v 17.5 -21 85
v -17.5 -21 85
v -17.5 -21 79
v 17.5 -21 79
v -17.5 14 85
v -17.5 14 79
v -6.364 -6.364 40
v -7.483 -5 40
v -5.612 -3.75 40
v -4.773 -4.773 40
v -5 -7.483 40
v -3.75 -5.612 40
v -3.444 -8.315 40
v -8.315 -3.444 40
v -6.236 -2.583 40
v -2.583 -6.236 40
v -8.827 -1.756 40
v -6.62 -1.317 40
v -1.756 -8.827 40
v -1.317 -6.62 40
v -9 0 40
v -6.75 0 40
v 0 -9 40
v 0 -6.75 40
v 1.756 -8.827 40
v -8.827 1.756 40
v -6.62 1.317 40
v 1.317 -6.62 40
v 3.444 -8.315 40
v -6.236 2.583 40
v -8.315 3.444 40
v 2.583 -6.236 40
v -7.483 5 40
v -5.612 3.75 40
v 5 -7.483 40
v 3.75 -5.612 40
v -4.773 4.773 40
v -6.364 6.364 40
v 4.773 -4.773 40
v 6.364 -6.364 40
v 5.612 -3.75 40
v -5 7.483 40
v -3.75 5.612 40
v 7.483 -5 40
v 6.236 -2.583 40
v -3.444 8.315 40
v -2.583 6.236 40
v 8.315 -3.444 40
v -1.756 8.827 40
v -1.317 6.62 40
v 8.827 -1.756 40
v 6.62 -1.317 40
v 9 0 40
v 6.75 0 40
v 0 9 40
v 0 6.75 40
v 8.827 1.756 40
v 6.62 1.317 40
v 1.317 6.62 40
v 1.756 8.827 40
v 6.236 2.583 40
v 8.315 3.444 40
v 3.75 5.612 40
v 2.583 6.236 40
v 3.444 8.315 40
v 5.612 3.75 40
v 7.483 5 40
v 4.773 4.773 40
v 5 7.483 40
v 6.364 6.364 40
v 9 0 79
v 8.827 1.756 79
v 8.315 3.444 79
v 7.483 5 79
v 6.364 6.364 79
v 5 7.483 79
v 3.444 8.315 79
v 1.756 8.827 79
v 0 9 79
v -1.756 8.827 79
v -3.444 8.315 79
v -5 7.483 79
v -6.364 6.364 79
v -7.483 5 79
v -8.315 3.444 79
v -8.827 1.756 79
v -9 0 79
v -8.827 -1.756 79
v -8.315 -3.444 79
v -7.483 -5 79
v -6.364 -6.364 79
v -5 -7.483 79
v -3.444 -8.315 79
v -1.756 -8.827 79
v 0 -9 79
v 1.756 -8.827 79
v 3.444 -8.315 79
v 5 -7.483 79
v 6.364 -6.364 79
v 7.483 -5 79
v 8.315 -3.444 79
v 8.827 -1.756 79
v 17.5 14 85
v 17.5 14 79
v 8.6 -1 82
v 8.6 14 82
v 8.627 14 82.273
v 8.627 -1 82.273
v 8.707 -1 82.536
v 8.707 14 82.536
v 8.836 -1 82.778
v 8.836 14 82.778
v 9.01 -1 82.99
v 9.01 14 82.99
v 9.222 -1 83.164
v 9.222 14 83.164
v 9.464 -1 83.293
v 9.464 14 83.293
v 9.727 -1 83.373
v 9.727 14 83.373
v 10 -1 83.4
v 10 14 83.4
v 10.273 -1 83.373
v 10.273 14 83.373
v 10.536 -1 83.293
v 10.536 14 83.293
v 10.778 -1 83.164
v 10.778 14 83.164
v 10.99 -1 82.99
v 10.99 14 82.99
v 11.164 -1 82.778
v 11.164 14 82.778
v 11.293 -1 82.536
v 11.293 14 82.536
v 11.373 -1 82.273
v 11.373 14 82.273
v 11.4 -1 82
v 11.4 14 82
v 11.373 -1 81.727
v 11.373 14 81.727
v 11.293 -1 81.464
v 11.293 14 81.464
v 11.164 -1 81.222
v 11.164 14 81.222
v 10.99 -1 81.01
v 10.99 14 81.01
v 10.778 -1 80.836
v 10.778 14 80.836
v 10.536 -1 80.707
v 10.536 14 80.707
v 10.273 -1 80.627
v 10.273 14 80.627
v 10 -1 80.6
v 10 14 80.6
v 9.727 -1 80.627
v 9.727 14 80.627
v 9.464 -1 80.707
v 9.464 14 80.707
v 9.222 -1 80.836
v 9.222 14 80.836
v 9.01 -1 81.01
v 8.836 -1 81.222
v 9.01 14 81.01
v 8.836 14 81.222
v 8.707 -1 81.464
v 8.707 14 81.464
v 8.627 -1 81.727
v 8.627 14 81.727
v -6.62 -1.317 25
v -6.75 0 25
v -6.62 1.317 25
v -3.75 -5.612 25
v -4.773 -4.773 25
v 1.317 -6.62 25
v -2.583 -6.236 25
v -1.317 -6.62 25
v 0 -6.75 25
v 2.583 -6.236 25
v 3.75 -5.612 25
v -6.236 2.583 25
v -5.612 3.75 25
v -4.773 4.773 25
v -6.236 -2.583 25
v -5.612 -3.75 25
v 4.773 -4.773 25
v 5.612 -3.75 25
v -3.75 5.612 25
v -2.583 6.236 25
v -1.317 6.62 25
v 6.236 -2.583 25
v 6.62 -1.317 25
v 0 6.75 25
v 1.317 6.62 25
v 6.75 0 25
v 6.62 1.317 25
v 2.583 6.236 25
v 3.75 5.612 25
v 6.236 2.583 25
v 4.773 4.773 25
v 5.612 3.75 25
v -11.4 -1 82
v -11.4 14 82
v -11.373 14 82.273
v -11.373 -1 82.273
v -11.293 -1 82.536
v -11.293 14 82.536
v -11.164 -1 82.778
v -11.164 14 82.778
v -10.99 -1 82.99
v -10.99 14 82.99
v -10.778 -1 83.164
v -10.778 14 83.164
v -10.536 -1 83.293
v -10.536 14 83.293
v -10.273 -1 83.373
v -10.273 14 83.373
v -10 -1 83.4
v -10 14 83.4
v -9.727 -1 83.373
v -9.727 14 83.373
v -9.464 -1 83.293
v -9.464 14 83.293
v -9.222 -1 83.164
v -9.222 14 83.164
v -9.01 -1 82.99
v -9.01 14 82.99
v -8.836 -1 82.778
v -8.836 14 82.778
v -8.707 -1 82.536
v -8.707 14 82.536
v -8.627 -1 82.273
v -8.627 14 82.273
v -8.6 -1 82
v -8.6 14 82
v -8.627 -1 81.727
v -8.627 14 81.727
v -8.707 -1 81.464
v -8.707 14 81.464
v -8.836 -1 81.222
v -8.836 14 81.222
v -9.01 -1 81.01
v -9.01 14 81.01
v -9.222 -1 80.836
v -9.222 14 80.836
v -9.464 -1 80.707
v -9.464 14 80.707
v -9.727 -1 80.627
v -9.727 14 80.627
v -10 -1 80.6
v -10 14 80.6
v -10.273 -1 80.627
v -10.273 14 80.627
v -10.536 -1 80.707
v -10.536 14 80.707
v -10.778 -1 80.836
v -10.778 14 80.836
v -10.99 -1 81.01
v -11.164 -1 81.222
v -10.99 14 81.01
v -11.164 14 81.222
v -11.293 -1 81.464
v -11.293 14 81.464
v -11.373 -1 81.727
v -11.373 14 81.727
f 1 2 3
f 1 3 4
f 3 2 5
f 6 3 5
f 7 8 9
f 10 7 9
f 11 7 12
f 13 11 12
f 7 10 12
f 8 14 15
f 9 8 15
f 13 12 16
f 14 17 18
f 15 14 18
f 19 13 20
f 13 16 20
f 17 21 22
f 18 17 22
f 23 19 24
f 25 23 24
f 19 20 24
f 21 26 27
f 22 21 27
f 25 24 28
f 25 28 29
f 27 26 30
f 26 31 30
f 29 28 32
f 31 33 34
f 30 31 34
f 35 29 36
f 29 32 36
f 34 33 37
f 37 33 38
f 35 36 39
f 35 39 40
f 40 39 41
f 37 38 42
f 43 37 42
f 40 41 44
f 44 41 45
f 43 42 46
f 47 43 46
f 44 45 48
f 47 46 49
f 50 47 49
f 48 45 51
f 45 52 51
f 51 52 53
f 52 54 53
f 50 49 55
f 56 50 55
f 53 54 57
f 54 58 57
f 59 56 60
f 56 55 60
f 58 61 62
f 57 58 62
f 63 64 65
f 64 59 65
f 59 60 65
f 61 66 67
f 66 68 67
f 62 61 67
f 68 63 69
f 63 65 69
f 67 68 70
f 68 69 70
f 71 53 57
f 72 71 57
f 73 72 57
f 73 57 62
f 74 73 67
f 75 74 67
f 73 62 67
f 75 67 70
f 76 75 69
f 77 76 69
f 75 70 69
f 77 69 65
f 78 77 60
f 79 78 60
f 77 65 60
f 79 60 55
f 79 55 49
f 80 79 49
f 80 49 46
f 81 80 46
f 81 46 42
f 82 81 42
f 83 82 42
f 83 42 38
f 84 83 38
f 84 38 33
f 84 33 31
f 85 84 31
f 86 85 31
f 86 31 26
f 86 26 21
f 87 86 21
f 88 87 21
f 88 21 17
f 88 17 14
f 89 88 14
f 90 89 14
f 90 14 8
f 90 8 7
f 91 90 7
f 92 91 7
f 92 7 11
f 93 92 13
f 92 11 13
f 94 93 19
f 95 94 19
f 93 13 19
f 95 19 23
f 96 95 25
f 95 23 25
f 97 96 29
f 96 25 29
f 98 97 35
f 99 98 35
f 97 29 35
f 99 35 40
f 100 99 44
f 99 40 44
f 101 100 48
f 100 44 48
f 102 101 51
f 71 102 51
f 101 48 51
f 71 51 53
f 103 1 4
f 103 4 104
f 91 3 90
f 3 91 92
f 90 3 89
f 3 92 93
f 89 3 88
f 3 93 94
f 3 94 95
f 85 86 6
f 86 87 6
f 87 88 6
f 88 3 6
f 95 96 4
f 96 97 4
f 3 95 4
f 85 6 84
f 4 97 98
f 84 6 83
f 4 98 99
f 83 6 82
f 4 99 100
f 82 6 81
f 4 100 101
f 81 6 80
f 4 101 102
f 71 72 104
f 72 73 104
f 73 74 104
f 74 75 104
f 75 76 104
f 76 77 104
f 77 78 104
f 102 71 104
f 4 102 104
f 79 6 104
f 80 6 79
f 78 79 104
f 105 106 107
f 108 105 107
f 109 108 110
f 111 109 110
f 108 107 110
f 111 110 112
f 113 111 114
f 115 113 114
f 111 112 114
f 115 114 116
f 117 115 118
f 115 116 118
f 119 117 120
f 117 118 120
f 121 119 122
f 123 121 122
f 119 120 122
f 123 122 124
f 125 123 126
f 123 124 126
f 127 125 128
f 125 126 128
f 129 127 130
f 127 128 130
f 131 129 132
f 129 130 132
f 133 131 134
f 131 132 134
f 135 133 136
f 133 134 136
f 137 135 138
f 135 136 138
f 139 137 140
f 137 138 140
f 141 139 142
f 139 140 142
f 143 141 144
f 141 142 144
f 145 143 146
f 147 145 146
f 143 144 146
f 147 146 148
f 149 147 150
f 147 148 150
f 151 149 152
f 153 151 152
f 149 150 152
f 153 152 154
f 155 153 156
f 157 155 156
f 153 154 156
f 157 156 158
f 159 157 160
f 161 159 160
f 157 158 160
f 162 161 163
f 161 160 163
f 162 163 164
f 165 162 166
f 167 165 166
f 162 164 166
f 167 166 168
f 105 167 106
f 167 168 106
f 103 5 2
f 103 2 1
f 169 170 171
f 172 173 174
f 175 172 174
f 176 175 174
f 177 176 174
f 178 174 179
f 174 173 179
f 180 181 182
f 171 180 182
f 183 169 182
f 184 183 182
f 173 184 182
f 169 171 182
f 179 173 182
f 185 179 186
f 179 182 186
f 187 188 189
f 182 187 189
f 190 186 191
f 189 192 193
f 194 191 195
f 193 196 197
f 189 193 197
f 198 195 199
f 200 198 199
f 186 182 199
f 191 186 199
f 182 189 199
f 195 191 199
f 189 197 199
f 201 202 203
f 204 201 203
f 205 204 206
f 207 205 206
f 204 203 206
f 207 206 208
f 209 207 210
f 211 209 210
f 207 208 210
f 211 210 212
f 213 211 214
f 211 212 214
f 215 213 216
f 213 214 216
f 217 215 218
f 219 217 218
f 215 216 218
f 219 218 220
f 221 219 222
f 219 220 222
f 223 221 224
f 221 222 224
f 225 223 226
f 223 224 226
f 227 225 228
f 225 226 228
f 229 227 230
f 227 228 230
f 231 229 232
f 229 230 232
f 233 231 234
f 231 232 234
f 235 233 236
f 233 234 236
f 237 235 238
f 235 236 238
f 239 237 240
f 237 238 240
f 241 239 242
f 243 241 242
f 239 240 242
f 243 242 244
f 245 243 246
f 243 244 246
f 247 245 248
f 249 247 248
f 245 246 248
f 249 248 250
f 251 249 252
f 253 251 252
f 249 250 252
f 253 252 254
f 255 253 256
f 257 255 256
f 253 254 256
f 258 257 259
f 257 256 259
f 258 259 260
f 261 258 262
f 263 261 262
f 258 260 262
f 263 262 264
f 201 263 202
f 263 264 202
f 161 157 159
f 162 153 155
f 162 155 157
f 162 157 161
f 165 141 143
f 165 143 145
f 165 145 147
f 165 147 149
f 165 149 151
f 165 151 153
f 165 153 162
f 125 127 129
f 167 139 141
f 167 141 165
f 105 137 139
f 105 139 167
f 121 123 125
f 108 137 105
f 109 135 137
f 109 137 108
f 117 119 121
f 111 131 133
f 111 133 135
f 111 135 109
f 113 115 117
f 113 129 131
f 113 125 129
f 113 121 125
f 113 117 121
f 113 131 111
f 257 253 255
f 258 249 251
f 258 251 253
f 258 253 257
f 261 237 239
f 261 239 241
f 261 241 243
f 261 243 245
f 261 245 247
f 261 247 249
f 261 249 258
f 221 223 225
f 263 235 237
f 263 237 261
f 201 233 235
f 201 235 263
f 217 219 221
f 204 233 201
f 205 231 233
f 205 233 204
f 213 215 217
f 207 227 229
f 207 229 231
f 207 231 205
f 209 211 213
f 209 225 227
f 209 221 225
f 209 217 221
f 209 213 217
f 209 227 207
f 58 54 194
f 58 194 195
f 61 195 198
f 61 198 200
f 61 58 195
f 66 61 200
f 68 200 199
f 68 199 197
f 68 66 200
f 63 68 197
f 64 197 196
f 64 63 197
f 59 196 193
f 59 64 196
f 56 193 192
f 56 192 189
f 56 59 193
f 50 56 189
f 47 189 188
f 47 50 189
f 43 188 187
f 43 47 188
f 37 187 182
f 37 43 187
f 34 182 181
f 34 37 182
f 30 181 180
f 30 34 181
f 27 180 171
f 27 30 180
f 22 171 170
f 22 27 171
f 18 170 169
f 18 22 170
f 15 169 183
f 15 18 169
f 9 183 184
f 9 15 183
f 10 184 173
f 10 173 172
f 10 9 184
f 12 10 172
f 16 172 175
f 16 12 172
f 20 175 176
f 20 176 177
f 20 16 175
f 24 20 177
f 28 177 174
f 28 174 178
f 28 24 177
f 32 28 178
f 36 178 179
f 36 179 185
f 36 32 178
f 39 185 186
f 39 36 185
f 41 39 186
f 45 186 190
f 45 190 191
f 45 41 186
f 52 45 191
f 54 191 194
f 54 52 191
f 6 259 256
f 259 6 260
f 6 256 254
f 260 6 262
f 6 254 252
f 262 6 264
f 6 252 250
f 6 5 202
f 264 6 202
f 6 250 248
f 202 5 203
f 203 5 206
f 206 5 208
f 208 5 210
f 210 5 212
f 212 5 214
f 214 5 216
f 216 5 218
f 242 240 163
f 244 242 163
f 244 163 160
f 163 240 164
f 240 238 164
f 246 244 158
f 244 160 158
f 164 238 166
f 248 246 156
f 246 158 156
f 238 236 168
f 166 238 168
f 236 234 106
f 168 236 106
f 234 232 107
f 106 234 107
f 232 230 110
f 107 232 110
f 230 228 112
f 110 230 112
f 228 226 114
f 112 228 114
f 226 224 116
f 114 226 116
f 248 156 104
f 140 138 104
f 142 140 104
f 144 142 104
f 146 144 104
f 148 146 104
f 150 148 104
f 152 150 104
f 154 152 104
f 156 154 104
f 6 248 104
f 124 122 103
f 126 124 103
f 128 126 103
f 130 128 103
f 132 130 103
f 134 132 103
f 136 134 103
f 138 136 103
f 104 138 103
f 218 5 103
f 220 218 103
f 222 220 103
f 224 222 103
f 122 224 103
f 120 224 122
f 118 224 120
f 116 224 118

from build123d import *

# Parameters (mm, degrees)
F1_R     = 6.75
F2_DEPTH = 15
F3_R     = 9
F4_DEPTH = 45
F5_W     = 35
F5_H     = 35
F5_R     = 9
F6_DEPTH = 6
F7_R     = 1.4
F8_DEPTH = 15


with BuildPart() as f2:
    # F1 (on offset) → F2 (new body)
    with BuildSketch(Plane.XY.offset(40)):
        Circle(F1_R)
    extrude(amount=-F2_DEPTH)

    # F3 (on offset) → F4 (join)
    with BuildSketch(Plane.XY.offset(40)):
        Circle(F3_R)
    extrude(amount=F4_DEPTH)

    # F5 (on face) → F6 (join)
    with BuildSketch(Plane.XY.offset(85)):
        with Locations((0, -3.5)):
            Rectangle(F5_W, F5_H)
        Circle(F5_R, mode=Mode.SUBTRACT)
    extrude(amount=-F6_DEPTH)

    # F7 (on face) → F8 (cut)
    with BuildSketch(Plane(origin=(0, 14, 0), x_dir=(-1, 0, 0), z_dir=(0, 1, 0))):
        with Locations((-10, 82)):
            Circle(F7_R)
        with Locations((10, 82)):
            Circle(F7_R)
    extrude(amount=-F8_DEPTH, mode=Mode.SUBTRACT)


solid = f2.part
